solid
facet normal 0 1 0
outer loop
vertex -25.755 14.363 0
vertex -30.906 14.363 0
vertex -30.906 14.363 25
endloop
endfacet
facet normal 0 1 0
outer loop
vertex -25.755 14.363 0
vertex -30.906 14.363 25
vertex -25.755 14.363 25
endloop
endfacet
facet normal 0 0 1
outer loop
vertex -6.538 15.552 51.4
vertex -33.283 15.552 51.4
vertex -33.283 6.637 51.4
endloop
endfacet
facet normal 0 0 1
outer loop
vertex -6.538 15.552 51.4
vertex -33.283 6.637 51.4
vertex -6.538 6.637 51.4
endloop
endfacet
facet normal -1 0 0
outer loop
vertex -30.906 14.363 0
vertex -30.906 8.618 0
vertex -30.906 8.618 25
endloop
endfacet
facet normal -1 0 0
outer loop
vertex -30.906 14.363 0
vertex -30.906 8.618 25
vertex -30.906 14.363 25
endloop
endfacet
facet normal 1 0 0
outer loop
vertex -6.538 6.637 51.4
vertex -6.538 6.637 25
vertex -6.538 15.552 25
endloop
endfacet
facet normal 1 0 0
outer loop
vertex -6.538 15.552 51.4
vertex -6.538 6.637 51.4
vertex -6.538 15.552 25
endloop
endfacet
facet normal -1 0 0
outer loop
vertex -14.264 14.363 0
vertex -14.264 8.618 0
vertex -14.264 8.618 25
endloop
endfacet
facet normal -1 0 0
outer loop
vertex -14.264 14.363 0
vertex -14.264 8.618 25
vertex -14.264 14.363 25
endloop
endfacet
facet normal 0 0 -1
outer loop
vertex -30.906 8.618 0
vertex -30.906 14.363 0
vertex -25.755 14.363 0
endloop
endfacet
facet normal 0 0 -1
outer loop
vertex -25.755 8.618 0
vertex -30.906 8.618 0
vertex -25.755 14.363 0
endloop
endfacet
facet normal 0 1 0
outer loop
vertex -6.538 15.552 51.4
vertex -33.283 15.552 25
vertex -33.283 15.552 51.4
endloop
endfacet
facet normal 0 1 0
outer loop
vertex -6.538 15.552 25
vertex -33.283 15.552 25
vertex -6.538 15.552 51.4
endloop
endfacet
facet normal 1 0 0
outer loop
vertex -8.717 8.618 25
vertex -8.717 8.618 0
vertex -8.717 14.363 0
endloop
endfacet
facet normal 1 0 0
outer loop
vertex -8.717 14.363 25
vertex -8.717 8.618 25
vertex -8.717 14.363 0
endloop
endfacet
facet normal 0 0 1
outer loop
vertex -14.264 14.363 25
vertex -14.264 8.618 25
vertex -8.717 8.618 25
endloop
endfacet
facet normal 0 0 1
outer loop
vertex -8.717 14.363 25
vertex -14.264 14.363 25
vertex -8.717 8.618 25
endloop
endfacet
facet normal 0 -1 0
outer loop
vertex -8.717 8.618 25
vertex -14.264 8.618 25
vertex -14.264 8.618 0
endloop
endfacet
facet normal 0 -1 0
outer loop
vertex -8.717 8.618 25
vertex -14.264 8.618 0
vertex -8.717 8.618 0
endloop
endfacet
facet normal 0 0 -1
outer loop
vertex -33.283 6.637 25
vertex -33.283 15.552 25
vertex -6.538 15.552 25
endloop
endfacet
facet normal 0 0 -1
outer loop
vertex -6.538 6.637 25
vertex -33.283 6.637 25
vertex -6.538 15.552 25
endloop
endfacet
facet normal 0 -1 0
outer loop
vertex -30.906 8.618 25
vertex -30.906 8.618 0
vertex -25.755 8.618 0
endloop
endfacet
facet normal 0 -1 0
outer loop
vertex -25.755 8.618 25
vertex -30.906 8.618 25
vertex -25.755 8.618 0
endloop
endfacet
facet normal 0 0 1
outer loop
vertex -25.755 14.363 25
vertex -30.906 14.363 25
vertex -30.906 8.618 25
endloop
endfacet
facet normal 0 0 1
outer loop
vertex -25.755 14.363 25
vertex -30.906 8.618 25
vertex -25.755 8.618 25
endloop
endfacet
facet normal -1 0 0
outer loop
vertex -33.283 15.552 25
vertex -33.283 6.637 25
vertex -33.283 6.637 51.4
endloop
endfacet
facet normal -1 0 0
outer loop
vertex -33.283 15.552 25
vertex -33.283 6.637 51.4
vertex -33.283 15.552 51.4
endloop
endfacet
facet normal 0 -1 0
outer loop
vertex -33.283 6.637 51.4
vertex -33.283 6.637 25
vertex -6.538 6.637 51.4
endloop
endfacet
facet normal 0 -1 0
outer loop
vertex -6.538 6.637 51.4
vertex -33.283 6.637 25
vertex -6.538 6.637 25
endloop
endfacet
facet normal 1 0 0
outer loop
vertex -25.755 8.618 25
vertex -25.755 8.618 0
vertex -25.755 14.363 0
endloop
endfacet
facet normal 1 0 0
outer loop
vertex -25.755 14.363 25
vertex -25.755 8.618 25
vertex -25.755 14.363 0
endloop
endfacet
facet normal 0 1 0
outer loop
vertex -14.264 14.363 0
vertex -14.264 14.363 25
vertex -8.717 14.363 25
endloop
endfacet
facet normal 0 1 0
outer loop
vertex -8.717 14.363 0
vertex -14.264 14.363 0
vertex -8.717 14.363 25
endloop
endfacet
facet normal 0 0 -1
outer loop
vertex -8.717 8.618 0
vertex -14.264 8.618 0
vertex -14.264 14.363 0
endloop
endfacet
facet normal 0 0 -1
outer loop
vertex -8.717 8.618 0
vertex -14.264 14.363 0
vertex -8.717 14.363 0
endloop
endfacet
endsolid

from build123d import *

# Parameters (mm, degrees)
F0_W     = 5.150944
F0_H     = 5.745283
F0_W_2   = 5.547169
F1_DEPTH = 25
F2_W     = 26.745285
F2_H     = 8.915094
F3_DEPTH = 26.4


with BuildPart() as f1:
    # F0 (on Top) → F1 (new body)
    with BuildSketch(Plane.XY):
        with Locations((-28.33019, 11.490566)):
            Rectangle(F0_W, F0_H)
        with Locations((-11.490566, 11.490566)):
            Rectangle(F0_W_2, F0_H)
    extrude(amount=F1_DEPTH)


with BuildPart() as f3:
    # F2 (on face) → F3 (new body)
    with BuildSketch(Plane.XY.offset(25)):
        with Locations((-19.910379, 11.09434)):
            Rectangle(F2_W, F2_H)
    extrude(amount=F3_DEPTH)


solid = Compound([f1.part, f3.part])
